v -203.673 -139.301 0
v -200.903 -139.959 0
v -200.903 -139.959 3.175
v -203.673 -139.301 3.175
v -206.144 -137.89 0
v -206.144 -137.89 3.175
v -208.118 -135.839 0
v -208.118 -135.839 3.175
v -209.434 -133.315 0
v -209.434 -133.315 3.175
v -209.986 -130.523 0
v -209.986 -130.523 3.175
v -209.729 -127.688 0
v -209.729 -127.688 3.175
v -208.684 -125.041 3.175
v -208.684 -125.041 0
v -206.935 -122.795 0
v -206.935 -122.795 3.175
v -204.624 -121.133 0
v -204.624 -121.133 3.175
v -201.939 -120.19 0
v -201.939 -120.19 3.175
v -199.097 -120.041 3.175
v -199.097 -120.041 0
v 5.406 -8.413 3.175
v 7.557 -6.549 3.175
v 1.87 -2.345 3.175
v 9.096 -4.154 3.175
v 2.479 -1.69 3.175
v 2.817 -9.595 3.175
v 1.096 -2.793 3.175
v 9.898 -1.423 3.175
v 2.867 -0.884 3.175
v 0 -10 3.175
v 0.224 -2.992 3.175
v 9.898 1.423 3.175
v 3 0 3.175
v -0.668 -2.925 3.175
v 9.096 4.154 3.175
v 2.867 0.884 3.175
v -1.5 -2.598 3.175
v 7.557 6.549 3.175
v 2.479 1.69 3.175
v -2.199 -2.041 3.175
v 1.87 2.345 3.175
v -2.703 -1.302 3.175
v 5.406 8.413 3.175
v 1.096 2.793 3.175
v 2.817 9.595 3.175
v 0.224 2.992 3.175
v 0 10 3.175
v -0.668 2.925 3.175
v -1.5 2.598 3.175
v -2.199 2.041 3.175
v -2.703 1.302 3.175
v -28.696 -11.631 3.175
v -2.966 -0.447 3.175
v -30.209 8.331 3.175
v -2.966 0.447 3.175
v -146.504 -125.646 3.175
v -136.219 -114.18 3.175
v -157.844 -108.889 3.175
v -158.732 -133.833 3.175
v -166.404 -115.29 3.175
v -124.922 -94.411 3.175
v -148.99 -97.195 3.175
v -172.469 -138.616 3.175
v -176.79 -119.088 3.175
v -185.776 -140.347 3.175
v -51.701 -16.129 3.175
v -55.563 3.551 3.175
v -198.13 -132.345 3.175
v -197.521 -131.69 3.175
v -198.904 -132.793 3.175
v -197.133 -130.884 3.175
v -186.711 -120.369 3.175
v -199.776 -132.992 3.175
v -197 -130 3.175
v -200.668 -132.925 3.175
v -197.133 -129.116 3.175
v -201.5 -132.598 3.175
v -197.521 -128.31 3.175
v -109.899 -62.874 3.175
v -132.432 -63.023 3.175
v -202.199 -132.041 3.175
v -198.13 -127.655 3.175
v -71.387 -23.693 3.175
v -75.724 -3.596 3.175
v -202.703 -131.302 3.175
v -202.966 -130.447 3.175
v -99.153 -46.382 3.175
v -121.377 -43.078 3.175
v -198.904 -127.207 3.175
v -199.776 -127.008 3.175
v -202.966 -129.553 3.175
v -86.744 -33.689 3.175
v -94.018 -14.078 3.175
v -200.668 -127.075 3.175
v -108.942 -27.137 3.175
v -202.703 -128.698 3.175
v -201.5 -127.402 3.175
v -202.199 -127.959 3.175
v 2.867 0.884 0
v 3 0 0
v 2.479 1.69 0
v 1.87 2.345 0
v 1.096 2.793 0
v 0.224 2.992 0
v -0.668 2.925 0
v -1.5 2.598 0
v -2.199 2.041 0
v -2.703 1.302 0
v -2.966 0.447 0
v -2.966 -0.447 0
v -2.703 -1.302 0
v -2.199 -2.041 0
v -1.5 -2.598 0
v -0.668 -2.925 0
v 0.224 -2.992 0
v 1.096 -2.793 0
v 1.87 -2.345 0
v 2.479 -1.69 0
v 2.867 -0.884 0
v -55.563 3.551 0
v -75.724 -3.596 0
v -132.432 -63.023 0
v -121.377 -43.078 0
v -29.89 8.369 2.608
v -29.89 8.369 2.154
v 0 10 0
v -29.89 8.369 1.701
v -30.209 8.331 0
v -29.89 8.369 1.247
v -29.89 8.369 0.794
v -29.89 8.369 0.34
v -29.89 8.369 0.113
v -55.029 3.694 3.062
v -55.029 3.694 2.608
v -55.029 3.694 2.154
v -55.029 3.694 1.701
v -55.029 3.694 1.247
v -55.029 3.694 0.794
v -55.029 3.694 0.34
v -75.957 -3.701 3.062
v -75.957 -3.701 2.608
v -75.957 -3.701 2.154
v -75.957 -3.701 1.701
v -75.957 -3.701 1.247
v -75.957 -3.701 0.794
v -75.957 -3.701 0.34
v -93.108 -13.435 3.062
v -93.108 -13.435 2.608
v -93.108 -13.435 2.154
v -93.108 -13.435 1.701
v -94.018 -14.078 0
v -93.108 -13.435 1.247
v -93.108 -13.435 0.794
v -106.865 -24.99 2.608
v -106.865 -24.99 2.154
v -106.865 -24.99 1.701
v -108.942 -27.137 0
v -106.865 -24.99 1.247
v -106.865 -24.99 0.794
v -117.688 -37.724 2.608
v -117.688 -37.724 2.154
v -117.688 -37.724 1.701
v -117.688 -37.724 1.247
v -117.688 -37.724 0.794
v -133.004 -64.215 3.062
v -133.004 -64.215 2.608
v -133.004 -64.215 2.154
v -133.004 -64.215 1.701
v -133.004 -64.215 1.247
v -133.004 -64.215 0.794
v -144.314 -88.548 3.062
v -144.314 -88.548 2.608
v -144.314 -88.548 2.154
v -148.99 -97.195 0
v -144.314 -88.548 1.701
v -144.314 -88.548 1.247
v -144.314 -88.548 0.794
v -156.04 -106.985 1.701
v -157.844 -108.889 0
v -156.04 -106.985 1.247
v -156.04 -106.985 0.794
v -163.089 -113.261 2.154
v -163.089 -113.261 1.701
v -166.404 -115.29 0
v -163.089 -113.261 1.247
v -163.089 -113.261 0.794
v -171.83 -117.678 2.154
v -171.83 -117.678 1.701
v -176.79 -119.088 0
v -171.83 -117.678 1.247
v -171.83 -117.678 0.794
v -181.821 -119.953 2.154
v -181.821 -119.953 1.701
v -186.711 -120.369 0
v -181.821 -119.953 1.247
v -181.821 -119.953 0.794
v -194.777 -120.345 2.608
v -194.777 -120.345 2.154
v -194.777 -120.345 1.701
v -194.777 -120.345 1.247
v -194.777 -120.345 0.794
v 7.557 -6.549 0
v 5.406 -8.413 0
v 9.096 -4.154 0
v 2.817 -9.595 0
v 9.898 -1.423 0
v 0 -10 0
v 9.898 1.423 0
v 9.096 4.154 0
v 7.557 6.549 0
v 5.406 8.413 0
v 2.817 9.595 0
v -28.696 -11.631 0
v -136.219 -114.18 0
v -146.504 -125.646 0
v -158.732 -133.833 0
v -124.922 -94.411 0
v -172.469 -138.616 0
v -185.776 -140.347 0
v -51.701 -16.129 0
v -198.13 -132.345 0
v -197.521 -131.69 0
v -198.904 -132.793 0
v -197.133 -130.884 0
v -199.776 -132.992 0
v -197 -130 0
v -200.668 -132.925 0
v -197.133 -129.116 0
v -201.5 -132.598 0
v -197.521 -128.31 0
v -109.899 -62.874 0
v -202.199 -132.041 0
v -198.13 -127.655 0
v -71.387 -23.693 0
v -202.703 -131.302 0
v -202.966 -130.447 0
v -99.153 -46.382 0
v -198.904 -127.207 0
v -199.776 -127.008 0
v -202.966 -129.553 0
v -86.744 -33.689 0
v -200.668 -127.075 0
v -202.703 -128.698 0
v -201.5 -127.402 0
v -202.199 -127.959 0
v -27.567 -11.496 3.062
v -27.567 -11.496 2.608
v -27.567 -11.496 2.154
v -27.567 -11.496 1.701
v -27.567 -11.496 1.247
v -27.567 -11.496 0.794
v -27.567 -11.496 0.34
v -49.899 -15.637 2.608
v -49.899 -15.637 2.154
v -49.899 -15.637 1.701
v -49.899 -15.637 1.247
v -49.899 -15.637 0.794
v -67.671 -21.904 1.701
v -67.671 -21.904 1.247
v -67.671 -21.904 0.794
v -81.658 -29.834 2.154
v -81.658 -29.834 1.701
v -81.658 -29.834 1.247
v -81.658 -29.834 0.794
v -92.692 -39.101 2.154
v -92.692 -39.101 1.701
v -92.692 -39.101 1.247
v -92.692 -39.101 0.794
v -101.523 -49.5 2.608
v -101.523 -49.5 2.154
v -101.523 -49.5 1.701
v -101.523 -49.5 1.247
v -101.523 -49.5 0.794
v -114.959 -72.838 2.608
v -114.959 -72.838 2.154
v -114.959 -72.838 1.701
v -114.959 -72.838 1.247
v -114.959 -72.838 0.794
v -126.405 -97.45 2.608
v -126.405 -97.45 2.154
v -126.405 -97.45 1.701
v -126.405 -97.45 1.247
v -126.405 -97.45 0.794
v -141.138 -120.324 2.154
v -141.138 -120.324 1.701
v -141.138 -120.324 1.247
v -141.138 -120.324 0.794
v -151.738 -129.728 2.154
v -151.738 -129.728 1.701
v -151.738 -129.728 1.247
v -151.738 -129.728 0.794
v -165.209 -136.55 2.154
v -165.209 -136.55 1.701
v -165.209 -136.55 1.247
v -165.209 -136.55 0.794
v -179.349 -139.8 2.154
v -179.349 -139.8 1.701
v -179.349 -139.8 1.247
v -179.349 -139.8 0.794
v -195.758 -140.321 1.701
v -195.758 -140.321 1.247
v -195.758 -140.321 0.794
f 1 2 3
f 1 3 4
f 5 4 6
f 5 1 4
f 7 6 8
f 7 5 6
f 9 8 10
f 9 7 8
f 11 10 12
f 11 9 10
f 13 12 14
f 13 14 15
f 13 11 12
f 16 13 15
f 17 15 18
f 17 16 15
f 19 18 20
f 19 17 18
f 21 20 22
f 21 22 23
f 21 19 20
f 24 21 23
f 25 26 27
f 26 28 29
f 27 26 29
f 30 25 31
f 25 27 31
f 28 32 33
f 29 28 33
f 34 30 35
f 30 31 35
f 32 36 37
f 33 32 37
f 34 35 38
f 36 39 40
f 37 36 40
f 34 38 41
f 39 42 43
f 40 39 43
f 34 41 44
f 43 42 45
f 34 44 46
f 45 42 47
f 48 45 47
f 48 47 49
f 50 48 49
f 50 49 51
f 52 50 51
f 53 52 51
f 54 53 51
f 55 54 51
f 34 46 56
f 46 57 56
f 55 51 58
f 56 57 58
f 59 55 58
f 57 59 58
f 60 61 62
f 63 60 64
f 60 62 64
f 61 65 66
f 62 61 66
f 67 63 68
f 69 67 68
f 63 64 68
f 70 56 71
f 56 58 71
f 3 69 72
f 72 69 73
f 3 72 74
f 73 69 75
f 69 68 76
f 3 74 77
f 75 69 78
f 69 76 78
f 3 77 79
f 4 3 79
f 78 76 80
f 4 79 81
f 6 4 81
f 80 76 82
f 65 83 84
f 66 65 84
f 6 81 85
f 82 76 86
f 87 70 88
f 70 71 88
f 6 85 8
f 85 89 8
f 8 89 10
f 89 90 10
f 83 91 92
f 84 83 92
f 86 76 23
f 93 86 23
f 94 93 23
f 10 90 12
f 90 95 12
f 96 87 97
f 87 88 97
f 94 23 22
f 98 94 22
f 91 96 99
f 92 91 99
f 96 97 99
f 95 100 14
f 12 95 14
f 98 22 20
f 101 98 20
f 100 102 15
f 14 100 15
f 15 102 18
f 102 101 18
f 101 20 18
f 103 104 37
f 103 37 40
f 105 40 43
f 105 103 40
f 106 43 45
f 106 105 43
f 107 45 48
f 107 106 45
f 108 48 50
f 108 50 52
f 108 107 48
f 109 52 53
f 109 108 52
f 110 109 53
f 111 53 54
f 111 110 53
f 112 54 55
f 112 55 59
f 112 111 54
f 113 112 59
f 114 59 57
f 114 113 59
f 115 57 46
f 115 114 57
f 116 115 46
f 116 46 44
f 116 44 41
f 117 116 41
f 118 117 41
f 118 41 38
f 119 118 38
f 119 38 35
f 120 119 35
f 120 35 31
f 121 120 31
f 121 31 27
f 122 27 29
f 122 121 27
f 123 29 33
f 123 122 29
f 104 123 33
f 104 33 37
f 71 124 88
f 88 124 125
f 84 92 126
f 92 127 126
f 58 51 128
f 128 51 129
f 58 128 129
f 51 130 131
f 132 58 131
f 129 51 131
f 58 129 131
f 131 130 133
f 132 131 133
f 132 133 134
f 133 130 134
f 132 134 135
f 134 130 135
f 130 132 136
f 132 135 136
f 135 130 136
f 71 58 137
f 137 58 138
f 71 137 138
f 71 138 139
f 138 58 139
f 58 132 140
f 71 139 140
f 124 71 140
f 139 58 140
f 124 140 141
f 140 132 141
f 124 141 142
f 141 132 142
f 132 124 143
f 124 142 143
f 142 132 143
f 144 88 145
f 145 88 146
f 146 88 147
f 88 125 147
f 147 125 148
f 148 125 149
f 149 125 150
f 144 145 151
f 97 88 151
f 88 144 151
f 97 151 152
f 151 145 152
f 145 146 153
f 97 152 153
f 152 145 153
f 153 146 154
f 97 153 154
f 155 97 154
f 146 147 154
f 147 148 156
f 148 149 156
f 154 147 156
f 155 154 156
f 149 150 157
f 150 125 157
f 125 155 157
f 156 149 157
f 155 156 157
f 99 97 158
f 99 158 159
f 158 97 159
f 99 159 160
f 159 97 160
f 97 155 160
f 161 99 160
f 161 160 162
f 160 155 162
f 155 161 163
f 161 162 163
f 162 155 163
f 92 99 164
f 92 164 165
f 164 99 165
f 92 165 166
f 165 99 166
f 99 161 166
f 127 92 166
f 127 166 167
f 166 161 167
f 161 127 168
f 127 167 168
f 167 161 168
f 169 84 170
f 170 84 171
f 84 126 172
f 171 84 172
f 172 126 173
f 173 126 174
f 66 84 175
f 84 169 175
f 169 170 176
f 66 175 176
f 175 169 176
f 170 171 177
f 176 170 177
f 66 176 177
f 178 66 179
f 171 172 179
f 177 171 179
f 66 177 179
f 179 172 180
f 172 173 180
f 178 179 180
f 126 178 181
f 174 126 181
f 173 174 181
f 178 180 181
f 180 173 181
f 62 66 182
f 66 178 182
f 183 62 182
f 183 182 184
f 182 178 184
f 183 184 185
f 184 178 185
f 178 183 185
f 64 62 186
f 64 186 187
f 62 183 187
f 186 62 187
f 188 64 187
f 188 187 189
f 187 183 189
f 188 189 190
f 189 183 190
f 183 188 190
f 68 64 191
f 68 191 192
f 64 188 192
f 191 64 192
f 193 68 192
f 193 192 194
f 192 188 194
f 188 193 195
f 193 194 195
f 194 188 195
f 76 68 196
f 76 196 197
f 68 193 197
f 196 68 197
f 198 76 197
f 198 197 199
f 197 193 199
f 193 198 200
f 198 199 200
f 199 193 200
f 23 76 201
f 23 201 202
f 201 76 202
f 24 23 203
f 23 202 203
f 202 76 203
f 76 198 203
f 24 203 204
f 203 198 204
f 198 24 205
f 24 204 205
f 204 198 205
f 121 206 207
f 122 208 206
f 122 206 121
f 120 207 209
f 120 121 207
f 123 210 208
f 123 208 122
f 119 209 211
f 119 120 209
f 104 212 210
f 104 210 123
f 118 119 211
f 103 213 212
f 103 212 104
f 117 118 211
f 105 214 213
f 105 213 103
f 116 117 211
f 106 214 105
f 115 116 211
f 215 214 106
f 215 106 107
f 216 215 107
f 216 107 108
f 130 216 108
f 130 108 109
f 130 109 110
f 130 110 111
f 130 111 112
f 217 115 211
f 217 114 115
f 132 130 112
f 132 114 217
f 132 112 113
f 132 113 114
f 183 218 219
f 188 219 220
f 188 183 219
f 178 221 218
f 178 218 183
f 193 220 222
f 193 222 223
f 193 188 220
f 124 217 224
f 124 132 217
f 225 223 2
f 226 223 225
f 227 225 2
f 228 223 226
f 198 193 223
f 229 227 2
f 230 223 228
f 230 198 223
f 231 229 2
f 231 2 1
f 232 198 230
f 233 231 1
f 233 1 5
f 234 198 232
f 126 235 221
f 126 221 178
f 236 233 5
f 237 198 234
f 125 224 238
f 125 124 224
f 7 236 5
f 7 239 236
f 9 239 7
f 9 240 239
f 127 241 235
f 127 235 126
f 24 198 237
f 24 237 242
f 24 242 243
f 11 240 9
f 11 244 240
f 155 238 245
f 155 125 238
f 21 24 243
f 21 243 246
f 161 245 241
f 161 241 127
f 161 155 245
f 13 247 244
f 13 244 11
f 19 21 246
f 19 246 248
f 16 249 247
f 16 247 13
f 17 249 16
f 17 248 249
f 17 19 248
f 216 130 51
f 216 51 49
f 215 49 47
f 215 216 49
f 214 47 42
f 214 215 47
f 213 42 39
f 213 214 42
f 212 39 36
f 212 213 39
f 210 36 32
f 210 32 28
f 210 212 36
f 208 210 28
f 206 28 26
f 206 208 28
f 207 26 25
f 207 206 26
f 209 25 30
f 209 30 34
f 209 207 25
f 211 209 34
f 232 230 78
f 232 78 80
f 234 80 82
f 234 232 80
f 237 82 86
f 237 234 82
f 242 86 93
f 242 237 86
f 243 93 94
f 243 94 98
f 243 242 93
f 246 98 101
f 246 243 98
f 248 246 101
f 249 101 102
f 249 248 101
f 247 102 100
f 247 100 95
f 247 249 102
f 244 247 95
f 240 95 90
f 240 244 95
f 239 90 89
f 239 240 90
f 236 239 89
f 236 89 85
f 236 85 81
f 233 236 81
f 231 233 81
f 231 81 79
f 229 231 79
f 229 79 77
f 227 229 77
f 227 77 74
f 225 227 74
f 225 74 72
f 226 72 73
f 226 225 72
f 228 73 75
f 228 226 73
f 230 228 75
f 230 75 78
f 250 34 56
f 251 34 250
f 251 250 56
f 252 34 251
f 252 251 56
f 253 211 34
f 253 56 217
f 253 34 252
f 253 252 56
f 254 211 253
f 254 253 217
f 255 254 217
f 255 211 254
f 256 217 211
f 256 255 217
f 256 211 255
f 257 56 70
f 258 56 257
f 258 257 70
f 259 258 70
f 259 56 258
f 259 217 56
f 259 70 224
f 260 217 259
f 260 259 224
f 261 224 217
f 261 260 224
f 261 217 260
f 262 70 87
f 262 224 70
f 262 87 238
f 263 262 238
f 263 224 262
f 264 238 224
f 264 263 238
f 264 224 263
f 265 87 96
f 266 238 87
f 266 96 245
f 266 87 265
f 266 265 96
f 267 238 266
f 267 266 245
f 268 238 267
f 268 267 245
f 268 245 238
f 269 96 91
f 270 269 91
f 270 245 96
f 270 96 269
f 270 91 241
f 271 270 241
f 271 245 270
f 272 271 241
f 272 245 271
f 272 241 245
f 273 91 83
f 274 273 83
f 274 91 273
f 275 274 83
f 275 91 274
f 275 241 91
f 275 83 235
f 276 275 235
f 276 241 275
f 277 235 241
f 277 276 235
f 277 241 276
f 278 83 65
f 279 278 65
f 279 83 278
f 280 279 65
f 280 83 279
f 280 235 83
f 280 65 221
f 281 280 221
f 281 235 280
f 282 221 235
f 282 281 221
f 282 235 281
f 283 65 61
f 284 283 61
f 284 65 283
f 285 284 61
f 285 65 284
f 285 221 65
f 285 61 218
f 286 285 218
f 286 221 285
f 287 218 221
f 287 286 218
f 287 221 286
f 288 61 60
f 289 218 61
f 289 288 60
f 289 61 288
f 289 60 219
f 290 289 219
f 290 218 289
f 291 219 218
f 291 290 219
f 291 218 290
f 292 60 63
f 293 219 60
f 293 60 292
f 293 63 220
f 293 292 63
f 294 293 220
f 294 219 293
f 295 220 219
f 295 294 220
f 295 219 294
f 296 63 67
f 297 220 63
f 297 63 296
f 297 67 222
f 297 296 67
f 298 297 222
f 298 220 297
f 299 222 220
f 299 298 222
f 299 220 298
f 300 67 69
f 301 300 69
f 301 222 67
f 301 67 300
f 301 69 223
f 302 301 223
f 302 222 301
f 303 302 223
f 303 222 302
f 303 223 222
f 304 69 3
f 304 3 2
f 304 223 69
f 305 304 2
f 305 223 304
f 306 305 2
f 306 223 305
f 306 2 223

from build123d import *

# Parameters (mm, degrees)
SKETCH2_R           = 3
BOSS_EXTRUDE1_DEPTH = 3.175


with BuildPart() as part:
    # Sketch2 → Boss-Extrude1 (new body)
    with BuildSketch(Plane.XY):
        with BuildLine():
            ThreePointArc((0, 10), (10, 0), (0, -10))
            add(Edge.make_bspline(
                [(0, -10), (-1.251020864, -10), (-3.774820805, -10.016454286), (-8.647714228, -10.113882577), (-14.535295335, -10.354194809), (-21.245865223, -10.824273004), (-29.746585805, -11.682556581), (-39.552493021, -13.169090017), (-50.089820276, -15.548726183), (-59.483660199, -18.458255584), (-70.610237991, -22.961745838), (-82.148564476, -29.615471875), (-93.054010705, -38.911736434), (-101.785405177, -49.341668998), (-108.943514578, -60.724171124), (-115.045937004, -72.782876008), (-120.624536438, -85.169554655), (-126.276327656, -97.517742627), (-132.698495585, -109.461640853), (-140.721639832, -120.579621109), (-149.489597914, -128.565293962), (-157.988102873, -133.649852232), (-165.090036196, -136.691162647), (-172.903862455, -138.88370963), (-180.005628003, -139.974310929), (-186.058063141, -140.398698048), (-190.788685764, -140.492078653), (-194.902893505, -140.380838582), (-198.289956322, -140.178624717), (-200.037485643, -140.037656252), (-200.903383383, -139.959111329)],
                knots=[0, 0, 0, 0, 0.0078125, 0.015625, 0.03125, 0.046875, 0.0625, 0.09375, 0.125, 0.15625, 0.1875, 0.25, 0.3125, 0.375, 0.4375, 0.5, 0.5625, 0.625, 0.6875, 0.75, 0.8125, 0.84375, 0.875, 0.90625, 0.9375, 0.953125, 0.96875, 0.984375, 0.9921875, 1, 1, 1, 1], degree=3))
            ThreePointArc((-200.903383383, -139.959111329), (-209.959111329, -129.096616617), (-199.096616617, -120.040888671))
            add(Edge.make_bspline(
                [(0, 10), (-1.338896135, 10), (-4.036631282, 9.982420404), (-9.271872007, 9.877844261), (-15.629863548, 9.618642545), (-22.936639656, 9.107283685), (-32.273749385, 8.165214939), (-43.203125935, 6.512222832), (-55.204214548, 3.807437165), (-66.155402215, 0.421098599), (-79.433418064, -4.944436555), (-93.675561018, -13.127882389), (-107.358604539, -24.79328789), (-118.079923605, -37.63772884), (-126.451066369, -50.997943321), (-133.166744909, -64.305937773), (-138.9074066, -77.065580836), (-144.288347953, -88.798976567), (-149.824694436, -99.027563746), (-155.898160469, -107.328609975), (-161.669374507, -112.527277269), (-167.083581014, -115.769099962), (-171.708355928, -117.756489287), (-177.065159674, -119.270992126), (-182.267818177, -120.080328974), (-186.933490647, -120.409425438), (-190.69395485, -120.485068399), (-194.061150572, -120.394947781), (-196.883542888, -120.226727877), (-198.36544529, -120.107212664), (-199.096616617, -120.040888671)],
                knots=[0, 0, 0, 0, 0.0078125, 0.015625, 0.03125, 0.046875, 0.0625, 0.09375, 0.125, 0.15625, 0.1875, 0.25, 0.3125, 0.375, 0.4375, 0.5, 0.5625, 0.625, 0.6875, 0.75, 0.8125, 0.84375, 0.875, 0.90625, 0.9375, 0.953125, 0.96875, 0.984375, 0.9921875, 1, 1, 1, 1], degree=3))
        make_face()
        Circle(SKETCH2_R, mode=Mode.SUBTRACT)
        with Locations((-200, -130)):
            Circle(SKETCH2_R, mode=Mode.SUBTRACT)
    extrude(amount=BOSS_EXTRUDE1_DEPTH)


solid = part.part
